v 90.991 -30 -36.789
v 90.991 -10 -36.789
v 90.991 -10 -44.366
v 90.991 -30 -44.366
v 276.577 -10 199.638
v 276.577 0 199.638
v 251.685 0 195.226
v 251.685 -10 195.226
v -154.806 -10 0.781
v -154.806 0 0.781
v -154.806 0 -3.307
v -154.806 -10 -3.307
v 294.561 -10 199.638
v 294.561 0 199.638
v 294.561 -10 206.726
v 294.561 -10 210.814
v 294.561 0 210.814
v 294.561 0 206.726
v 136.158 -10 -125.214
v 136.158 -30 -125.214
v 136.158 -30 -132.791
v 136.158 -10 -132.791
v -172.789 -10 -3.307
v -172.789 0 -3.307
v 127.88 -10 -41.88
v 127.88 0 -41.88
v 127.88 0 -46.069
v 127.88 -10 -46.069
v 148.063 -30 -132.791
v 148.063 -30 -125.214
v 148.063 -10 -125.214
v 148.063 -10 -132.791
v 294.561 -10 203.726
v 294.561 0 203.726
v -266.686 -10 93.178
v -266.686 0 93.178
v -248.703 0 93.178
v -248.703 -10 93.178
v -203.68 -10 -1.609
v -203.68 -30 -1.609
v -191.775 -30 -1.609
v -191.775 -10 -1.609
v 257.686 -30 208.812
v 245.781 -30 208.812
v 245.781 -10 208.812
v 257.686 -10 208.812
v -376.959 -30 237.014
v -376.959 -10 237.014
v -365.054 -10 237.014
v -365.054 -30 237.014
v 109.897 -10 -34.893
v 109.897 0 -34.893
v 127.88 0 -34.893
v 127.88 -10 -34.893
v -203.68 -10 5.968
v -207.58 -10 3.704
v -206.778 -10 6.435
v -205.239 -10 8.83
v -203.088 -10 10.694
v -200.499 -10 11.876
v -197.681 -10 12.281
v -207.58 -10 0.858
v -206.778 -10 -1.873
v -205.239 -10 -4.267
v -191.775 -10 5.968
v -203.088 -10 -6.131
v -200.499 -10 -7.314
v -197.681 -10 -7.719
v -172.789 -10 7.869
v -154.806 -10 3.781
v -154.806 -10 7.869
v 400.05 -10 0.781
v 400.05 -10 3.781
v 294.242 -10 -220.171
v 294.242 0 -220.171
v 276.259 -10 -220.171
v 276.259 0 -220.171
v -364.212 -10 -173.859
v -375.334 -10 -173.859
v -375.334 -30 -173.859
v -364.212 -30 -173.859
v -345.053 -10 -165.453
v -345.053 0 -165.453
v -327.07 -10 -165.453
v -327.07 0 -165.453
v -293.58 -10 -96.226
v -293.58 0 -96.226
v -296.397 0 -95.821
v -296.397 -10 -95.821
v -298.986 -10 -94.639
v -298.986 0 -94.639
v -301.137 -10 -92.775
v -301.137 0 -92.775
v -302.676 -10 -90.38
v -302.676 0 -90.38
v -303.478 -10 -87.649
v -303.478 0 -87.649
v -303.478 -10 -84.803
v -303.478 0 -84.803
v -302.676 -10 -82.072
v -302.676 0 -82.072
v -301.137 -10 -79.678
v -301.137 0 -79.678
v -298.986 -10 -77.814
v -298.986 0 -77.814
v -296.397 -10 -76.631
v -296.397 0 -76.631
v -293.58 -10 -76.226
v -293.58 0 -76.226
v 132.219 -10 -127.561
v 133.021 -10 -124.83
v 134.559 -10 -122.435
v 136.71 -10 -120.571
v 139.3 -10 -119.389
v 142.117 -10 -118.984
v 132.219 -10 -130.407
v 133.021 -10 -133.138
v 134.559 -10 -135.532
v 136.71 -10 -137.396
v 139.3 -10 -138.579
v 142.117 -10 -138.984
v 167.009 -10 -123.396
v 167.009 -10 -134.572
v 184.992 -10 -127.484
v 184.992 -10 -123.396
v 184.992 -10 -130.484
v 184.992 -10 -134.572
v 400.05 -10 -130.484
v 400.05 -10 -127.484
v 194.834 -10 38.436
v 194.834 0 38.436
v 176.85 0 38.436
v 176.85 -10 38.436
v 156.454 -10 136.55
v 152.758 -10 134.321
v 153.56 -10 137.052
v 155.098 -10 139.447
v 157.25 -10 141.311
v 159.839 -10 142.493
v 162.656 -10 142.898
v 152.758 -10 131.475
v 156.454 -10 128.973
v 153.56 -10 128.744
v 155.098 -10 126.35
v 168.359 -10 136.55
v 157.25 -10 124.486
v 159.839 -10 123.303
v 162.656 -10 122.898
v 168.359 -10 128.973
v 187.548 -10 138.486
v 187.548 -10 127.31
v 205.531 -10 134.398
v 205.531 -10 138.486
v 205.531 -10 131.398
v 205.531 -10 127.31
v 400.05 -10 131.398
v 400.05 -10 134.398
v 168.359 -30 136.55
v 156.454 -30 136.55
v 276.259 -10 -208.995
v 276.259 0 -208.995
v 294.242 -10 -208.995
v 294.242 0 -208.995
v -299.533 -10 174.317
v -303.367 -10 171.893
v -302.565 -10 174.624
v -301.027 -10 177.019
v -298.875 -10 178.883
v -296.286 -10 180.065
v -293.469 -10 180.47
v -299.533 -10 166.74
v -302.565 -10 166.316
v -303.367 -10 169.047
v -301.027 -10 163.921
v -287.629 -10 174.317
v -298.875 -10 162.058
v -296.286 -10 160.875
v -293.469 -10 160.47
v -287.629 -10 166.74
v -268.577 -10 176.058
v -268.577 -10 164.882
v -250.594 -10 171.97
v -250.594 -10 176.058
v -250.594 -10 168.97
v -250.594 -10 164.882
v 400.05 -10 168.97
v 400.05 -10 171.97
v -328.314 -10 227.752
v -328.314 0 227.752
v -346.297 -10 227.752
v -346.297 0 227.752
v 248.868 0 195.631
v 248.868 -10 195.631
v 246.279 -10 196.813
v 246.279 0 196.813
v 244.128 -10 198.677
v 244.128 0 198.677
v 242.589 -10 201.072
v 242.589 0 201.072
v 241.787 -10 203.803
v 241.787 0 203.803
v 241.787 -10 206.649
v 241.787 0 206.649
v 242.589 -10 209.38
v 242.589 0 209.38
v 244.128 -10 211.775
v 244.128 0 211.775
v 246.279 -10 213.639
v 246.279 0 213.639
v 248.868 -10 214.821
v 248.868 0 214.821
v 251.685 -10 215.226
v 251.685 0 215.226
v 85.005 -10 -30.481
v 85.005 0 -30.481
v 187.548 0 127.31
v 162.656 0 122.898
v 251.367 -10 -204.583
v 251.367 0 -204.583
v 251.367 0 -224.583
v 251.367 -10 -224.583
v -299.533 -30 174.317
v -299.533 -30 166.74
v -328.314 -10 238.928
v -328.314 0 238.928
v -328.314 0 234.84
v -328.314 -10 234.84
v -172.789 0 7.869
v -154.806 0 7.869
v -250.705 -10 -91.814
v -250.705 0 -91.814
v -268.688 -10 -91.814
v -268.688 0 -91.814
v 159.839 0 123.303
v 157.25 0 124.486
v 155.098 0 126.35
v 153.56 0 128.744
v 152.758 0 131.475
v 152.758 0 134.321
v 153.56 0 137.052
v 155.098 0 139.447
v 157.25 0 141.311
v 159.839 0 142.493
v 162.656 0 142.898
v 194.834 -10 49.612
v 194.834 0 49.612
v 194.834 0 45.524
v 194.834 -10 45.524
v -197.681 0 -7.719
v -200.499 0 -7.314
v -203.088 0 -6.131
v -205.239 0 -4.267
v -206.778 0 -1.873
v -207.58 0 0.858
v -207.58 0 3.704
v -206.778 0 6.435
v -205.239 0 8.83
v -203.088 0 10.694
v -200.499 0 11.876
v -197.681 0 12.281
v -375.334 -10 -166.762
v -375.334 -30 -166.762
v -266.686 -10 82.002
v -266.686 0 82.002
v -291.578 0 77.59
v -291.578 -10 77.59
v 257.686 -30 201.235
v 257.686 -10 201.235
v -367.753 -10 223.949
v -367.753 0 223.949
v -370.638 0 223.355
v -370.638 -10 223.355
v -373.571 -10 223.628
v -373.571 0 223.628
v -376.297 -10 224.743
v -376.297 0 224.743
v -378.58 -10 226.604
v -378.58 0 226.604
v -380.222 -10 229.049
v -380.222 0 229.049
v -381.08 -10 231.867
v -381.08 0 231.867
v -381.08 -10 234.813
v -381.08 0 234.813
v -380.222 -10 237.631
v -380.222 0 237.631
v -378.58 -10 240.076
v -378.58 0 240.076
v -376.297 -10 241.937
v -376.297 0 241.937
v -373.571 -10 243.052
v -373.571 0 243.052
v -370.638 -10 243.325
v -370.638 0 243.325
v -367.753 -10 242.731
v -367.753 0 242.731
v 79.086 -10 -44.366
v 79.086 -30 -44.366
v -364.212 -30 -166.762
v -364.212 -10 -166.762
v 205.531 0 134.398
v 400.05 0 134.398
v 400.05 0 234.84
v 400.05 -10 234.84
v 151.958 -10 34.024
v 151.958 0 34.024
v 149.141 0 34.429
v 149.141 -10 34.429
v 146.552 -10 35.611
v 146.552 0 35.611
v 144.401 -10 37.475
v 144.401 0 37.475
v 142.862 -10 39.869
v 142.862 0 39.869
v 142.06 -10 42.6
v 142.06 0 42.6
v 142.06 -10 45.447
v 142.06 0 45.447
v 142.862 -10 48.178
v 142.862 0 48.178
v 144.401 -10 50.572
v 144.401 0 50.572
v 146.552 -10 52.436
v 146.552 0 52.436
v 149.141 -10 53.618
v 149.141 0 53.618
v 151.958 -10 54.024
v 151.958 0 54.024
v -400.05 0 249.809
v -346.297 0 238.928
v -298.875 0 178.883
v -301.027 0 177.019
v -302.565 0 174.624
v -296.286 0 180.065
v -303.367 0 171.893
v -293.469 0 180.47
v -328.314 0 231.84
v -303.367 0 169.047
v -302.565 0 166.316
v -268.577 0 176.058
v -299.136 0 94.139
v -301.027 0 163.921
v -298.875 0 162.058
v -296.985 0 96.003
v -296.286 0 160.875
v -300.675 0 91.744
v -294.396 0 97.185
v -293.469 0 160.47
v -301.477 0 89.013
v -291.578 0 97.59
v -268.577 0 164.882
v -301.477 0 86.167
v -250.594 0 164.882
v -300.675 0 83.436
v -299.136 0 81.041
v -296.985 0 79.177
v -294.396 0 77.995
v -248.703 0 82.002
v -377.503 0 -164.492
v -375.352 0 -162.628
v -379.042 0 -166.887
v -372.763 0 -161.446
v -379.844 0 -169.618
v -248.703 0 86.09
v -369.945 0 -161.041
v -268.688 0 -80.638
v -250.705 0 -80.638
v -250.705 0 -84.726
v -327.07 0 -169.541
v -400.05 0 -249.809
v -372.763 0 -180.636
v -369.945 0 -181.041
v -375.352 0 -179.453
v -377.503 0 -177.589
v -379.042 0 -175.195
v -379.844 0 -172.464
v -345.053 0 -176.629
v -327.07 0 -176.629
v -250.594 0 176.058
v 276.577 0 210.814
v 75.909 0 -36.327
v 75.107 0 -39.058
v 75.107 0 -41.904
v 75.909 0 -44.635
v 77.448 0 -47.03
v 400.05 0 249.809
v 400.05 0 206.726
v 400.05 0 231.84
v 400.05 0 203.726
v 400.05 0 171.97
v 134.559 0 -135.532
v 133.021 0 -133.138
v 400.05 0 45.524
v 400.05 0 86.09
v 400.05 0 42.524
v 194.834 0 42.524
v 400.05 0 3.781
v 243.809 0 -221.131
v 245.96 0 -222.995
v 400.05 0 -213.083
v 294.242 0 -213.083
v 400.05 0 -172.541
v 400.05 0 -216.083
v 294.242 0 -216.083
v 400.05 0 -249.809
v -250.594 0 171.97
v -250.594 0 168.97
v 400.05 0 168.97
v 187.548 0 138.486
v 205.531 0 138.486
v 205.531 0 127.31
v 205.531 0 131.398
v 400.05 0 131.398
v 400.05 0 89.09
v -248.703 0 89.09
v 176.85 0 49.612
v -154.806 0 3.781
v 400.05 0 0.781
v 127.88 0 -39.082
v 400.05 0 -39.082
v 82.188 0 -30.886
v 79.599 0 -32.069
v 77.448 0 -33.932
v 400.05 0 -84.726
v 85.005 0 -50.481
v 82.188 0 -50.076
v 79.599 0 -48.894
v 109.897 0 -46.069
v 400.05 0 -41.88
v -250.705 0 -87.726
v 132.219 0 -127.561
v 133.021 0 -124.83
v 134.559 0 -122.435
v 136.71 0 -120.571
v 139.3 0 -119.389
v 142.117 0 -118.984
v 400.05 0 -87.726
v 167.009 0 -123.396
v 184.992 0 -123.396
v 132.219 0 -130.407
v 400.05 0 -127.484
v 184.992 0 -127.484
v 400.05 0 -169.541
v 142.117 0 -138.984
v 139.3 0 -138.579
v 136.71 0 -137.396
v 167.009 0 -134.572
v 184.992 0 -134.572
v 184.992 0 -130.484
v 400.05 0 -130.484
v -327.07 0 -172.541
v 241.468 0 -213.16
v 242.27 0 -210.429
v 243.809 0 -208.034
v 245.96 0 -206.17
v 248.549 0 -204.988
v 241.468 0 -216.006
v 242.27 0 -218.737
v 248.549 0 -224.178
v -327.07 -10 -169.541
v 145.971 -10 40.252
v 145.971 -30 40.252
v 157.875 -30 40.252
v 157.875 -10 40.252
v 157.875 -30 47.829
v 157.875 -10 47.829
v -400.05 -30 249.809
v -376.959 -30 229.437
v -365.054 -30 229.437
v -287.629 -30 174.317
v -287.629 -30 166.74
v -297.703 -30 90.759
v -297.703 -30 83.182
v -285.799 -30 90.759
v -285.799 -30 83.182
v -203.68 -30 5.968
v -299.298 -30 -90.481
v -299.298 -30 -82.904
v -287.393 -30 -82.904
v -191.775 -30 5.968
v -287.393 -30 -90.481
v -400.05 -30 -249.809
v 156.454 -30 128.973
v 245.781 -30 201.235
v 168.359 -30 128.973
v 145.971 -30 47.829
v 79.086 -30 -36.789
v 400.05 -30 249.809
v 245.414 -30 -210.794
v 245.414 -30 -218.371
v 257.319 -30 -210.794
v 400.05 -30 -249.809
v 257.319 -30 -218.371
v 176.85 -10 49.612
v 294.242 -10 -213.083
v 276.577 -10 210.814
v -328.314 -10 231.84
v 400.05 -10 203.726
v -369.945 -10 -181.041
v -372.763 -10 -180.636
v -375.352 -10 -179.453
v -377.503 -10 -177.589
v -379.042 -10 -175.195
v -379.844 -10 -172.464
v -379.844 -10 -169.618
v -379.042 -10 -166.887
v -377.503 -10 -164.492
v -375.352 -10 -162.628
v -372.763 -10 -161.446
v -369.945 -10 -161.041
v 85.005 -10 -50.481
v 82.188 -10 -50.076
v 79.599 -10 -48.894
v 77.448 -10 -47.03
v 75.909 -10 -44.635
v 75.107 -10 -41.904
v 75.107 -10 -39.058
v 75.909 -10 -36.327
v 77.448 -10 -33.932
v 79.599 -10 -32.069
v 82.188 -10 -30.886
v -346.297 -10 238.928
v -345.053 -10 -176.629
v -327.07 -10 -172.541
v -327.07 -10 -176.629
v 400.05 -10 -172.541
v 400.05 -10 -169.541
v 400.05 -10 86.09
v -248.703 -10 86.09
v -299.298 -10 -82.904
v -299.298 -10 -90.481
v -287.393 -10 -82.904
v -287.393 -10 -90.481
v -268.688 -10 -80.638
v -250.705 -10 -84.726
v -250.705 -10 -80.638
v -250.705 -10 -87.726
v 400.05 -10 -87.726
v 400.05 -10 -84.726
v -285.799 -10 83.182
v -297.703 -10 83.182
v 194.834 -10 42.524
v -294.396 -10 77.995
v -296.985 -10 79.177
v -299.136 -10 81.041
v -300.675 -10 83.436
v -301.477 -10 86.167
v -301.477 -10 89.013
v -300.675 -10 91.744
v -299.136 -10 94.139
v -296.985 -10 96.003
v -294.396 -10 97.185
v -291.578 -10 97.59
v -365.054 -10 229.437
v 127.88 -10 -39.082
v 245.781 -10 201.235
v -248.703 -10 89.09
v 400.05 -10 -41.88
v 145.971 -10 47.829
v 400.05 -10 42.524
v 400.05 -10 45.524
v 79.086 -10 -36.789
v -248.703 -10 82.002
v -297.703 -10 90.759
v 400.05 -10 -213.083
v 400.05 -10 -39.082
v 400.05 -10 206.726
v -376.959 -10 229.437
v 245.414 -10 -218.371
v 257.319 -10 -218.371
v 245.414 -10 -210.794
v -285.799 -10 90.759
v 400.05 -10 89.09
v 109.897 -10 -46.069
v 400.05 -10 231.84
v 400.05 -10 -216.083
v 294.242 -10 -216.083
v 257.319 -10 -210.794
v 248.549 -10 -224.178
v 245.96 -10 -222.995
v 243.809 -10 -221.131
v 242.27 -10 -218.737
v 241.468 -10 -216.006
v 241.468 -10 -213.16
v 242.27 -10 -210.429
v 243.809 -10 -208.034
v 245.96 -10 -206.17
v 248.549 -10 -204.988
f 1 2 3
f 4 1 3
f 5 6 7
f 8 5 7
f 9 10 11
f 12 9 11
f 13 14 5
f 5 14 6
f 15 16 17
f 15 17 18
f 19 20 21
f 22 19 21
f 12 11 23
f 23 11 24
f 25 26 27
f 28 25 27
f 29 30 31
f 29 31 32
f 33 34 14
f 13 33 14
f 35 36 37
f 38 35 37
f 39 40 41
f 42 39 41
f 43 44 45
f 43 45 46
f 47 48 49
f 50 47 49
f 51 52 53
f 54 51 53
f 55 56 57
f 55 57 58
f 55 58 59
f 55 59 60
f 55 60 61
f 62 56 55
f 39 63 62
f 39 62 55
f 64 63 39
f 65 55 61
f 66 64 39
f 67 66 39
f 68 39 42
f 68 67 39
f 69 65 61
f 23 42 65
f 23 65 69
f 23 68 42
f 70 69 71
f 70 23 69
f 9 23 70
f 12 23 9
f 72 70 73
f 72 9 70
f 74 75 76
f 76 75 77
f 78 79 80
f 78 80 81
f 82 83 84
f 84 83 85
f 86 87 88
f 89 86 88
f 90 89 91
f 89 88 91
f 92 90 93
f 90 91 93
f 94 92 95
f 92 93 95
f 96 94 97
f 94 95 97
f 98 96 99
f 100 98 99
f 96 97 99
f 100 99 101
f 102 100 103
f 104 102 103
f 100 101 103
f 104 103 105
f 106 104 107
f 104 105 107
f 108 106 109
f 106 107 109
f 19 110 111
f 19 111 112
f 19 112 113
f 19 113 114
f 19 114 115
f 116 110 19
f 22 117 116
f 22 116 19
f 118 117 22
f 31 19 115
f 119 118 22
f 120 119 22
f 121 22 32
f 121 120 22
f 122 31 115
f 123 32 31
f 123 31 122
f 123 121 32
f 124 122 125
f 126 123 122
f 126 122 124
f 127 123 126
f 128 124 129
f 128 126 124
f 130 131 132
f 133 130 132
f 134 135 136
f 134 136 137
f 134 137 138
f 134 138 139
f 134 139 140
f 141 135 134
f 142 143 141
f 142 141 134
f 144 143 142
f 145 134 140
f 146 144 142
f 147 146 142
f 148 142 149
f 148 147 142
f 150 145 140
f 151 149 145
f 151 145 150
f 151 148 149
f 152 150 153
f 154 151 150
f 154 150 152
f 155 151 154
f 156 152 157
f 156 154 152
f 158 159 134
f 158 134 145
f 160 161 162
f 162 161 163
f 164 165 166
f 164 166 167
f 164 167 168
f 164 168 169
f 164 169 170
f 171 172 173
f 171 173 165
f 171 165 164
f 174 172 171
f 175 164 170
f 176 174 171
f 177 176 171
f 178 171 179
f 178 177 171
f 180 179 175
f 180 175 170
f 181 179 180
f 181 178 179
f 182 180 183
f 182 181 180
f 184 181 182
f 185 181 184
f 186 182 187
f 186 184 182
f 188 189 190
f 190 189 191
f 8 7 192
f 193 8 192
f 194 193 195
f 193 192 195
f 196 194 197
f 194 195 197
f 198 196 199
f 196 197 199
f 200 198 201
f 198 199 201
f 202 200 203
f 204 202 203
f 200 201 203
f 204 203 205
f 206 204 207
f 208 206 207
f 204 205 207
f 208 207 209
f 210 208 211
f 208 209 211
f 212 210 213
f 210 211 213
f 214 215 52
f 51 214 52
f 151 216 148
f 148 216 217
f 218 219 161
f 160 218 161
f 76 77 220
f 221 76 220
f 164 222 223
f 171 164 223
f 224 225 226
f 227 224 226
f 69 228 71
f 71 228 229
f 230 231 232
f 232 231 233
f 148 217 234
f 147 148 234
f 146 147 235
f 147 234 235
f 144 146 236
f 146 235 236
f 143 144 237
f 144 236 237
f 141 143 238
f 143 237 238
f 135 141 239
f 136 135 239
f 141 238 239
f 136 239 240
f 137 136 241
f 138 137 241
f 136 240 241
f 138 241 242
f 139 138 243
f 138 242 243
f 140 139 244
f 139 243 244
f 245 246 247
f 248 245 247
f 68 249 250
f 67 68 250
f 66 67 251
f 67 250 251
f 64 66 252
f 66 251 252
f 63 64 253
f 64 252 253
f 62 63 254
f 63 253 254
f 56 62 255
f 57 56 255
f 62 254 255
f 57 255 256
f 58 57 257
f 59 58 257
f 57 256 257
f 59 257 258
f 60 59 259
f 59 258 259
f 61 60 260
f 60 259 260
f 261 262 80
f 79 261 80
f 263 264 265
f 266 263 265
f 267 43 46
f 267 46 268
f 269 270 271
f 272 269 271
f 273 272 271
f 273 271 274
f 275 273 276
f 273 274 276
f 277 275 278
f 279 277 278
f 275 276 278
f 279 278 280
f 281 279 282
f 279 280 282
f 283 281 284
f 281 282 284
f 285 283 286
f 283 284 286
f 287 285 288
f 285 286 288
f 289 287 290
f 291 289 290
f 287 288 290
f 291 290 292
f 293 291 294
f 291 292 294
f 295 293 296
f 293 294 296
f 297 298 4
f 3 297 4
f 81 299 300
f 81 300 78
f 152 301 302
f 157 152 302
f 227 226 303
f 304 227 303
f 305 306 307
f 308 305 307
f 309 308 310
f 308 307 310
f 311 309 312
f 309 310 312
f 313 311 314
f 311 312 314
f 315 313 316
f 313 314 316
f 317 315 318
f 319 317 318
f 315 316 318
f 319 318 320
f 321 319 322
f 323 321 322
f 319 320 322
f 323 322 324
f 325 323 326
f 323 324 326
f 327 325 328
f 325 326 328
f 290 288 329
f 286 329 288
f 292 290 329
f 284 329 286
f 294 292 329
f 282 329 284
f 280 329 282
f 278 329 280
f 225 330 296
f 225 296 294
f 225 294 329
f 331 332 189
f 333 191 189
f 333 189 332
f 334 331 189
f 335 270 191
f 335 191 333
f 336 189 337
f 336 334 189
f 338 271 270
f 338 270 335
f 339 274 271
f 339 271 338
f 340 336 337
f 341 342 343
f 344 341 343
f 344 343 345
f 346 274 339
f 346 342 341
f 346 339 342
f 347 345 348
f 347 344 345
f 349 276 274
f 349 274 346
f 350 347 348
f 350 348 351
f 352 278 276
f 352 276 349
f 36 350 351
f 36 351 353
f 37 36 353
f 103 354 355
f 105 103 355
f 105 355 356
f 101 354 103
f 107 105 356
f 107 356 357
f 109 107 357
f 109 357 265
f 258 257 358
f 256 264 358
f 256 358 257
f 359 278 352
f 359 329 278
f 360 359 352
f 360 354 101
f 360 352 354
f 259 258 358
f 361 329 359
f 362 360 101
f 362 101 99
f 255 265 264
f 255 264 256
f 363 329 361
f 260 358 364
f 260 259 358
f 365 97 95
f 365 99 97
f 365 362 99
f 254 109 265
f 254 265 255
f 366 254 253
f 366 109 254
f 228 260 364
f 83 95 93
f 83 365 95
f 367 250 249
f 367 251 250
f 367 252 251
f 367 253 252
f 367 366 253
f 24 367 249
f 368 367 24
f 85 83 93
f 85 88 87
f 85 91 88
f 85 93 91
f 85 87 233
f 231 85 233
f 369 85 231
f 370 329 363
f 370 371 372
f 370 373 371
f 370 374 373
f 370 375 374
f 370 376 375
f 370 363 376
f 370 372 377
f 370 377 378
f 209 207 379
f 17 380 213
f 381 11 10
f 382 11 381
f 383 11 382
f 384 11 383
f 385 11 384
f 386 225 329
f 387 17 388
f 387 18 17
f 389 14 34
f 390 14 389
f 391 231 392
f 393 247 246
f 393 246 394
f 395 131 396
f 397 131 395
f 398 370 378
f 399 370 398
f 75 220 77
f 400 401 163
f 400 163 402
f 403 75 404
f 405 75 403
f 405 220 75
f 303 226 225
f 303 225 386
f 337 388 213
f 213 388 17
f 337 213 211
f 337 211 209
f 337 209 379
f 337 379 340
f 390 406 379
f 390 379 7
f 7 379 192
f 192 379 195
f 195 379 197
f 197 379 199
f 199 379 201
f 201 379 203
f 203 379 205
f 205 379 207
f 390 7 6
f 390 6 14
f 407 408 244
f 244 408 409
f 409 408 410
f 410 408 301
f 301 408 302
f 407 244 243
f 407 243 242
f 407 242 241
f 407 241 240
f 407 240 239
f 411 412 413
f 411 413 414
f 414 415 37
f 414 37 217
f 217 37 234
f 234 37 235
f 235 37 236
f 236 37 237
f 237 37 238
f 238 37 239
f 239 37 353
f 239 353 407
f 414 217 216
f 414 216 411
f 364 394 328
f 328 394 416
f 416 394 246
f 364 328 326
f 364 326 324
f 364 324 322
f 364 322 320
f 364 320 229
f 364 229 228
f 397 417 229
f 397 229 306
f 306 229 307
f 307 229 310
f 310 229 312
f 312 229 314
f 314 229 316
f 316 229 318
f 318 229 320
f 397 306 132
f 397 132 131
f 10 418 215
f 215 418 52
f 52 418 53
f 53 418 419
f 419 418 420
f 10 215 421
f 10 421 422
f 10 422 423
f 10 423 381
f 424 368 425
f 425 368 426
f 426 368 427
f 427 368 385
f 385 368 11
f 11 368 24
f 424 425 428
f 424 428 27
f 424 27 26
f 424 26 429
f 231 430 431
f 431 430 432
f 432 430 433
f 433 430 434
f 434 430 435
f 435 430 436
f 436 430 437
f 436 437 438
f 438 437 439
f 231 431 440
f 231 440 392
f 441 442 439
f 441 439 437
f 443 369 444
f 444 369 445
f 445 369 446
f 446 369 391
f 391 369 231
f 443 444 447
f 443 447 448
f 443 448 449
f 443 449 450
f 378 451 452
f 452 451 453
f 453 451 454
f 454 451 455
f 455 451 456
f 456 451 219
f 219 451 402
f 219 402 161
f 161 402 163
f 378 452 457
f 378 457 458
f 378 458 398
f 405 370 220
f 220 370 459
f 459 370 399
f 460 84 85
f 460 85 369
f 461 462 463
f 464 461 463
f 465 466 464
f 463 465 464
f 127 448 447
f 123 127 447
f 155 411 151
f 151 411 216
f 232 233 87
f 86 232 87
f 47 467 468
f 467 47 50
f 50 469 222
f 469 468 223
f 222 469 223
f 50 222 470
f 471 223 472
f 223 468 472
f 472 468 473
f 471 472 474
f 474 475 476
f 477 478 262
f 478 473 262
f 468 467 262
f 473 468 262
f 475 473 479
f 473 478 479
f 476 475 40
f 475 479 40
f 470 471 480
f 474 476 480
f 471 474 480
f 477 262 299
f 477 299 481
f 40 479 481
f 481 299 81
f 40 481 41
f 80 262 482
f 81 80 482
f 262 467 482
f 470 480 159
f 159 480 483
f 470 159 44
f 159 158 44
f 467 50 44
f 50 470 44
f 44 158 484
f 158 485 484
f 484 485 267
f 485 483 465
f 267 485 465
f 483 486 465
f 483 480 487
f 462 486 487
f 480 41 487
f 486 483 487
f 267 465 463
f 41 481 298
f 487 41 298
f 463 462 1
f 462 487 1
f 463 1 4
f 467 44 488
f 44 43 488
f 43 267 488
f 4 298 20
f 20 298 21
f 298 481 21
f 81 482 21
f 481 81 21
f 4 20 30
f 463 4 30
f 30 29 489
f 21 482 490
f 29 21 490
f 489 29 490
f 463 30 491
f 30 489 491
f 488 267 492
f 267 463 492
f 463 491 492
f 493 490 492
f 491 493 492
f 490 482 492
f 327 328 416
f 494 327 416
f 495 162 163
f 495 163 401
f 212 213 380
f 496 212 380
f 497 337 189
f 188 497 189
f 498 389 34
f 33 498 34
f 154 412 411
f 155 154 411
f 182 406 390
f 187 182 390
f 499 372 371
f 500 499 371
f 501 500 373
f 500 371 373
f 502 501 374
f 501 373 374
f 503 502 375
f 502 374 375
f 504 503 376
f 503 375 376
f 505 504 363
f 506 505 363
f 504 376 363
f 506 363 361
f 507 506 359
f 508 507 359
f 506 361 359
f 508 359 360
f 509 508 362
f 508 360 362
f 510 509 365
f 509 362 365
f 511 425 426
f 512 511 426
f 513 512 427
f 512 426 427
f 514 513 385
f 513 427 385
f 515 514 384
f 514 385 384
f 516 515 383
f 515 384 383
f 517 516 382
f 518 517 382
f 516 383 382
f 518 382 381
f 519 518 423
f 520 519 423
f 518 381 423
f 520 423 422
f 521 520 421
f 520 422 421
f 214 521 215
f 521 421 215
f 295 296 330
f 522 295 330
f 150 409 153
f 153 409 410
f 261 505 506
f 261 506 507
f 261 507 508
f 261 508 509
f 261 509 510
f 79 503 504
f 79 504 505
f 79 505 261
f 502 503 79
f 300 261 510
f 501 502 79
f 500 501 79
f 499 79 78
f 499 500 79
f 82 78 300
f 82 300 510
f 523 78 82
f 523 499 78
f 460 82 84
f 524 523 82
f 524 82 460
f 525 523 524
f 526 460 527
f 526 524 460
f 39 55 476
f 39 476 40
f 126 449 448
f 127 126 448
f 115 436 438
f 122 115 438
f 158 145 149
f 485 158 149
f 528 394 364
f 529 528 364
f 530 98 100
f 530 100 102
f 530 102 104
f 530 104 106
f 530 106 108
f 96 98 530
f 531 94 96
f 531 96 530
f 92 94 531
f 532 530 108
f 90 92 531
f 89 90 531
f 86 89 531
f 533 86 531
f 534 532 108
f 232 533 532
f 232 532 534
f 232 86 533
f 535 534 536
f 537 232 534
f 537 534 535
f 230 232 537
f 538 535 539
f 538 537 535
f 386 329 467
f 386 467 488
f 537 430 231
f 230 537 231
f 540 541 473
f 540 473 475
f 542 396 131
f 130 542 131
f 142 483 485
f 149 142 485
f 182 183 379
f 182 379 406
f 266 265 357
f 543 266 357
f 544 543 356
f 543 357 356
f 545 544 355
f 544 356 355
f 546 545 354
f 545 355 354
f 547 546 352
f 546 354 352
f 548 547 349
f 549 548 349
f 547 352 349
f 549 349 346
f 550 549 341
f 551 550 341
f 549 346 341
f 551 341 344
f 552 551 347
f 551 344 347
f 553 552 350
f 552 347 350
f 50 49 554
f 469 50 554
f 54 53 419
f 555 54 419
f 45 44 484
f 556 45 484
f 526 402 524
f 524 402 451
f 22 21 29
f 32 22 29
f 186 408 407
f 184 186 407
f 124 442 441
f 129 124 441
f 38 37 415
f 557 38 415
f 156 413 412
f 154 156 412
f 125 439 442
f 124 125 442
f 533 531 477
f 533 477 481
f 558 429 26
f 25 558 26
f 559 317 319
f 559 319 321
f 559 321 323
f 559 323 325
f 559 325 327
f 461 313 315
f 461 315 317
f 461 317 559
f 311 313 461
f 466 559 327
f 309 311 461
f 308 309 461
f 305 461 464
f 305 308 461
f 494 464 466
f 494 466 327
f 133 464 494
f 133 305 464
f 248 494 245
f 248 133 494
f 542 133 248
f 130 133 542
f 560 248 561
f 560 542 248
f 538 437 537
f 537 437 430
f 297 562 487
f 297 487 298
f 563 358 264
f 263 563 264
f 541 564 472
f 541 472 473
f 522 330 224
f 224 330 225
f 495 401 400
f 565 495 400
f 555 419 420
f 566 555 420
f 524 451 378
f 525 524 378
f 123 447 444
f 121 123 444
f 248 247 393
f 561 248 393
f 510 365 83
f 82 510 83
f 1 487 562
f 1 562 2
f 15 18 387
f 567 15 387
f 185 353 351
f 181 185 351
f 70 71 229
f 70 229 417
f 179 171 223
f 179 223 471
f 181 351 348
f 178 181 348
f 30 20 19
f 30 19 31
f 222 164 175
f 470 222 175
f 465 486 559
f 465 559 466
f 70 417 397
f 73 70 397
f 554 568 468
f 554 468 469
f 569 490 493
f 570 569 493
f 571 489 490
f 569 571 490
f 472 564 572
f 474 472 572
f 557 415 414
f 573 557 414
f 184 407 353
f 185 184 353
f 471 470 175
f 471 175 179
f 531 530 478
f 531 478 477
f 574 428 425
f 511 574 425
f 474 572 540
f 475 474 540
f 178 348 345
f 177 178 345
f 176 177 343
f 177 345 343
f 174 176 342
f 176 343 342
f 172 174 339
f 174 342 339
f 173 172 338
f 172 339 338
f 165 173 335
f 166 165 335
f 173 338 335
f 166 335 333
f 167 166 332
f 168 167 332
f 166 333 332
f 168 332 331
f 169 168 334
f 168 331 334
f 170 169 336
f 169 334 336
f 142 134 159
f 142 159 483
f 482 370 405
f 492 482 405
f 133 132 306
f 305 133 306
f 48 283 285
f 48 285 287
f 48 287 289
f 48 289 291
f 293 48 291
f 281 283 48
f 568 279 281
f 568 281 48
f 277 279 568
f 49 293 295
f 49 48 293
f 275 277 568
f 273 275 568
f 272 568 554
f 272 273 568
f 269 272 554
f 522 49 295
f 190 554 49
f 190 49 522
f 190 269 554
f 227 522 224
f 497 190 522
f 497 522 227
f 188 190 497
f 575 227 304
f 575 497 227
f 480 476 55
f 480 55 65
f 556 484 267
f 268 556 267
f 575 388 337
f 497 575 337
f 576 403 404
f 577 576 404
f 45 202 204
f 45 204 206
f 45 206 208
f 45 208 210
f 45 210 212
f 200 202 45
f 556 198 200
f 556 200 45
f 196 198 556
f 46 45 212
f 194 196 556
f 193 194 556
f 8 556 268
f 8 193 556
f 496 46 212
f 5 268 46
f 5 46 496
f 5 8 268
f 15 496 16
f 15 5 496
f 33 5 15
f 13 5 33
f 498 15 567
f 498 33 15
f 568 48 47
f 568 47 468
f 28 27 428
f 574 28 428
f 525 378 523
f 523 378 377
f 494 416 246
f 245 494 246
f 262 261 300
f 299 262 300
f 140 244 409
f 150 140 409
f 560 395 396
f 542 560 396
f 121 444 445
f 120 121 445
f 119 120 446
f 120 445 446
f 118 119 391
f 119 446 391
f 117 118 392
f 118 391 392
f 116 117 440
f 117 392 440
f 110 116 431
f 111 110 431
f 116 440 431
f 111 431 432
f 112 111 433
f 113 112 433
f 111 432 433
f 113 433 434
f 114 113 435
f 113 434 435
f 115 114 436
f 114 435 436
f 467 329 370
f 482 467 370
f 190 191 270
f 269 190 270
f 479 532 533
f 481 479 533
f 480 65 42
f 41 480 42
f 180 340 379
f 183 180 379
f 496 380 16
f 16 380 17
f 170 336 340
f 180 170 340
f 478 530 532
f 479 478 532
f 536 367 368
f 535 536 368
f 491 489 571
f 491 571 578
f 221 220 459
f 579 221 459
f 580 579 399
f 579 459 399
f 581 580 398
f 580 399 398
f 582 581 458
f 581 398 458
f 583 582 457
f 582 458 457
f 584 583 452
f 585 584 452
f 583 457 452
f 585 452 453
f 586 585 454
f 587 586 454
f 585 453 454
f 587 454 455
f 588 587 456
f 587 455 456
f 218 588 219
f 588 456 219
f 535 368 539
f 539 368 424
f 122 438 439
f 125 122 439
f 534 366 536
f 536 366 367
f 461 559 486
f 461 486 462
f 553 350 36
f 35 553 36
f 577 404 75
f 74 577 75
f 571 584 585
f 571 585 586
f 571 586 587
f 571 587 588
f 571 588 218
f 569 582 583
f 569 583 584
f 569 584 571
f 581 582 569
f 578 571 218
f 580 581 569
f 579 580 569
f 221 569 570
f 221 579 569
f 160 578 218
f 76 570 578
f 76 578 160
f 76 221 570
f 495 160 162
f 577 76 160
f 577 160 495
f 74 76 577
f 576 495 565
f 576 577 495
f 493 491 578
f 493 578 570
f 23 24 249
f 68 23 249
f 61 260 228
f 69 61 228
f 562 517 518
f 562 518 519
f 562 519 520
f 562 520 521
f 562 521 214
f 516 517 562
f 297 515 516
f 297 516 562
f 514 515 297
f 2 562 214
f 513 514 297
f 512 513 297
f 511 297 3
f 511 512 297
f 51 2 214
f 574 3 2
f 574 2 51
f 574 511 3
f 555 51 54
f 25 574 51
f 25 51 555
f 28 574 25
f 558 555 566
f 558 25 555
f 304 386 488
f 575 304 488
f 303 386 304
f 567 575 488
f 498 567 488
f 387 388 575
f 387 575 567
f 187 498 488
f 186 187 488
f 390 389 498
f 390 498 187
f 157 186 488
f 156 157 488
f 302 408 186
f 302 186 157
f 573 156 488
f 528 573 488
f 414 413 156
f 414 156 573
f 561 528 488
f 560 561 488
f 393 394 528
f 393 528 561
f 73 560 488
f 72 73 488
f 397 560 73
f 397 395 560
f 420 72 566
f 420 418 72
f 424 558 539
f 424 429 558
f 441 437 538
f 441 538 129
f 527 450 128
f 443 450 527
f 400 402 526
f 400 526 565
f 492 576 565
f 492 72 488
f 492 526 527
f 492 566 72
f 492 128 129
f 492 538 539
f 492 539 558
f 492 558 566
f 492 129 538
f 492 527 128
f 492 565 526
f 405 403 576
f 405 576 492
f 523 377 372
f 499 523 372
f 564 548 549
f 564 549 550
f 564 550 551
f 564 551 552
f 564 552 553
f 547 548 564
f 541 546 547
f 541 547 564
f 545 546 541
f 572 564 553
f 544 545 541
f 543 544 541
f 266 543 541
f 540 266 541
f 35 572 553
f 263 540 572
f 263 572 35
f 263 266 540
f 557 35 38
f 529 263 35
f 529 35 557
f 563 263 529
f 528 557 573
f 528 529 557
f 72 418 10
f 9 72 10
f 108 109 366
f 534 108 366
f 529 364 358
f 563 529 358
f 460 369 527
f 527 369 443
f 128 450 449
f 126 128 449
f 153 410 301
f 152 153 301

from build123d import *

# Parameters (mm, degrees)
SKETCH1_W           = 800.1
SKETCH1_H           = 499.618
BOSS_EXTRUDE1_DEPTH = 30
CUT_EXTRUDE3_DEPTH  = 10
SKETCH3_W           = 11.904533089
SKETCH3_H           = 7.577050726
SKETCH3_W_2         = 11.121408268
SKETCH3_H_2         = 7.09624417
SKETCH3_H_3         = 7.577050727
SKETCH3_W_3         = 11.90453309
CUT_EXTRUDE5_DEPTH  = 473.06412592


with BuildPart() as part:
    # Sketch1 → Boss-Extrude1 (new body)
    with BuildSketch(Plane(origin=(0, 0, 0), x_dir=(1, 0, 0), z_dir=(0, 1, 0))):
        Rectangle(SKETCH1_W, SKETCH1_H)
    extrude(amount=-BOSS_EXTRUDE1_DEPTH)

    # Sketch2 → Cut-Extrude3 (cut)
    with BuildSketch(Plane(origin=(0, 0, 0), x_dir=(1, 0, 0), z_dir=(0, 1, 0))):
        with BuildLine():
            ThreePointArc((251.366710834, 224.582705951), (241.366710834, 214.582705951), (251.366710834, 204.582705951))
            Line((251.366710834, 204.582705951), (276.258710834, 208.994705951))
            Line((276.258710834, 208.994705951), (294.241910834, 208.994705951))
            Line((294.241910834, 208.994705951), (294.241910834, 213.082705951))
            Line((294.241910834, 213.082705951), (400.05, 213.082705951))
            Line((400.05, 213.082705951), (400.05, 216.082705951))
            Line((400.05, 216.082705951), (294.241910834, 216.082705951))
            Line((294.241910834, 216.082705951), (294.241910834, 220.170705951))
            Line((294.241910834, 220.170705951), (276.258710834, 220.170705951))
            Line((276.258710834, 220.170705951), (251.366710834, 224.582705951))
        make_face()
        with BuildLine():
            ThreePointArc((-369.945334755, 181.04073751), (-379.945334755, 171.04073751), (-369.945334755, 161.04073751))
            Line((-369.945334755, 161.04073751), (-345.053334755, 165.45273751))
            Line((-345.053334755, 165.45273751), (-327.070134755, 165.45273751))
            Line((-327.070134755, 165.45273751), (-327.070134755, 169.54073751))
            Line((-327.070134755, 169.54073751), (400.05, 169.54073751))
            Line((400.05, 169.54073751), (400.05, 172.54073751))
            Line((400.05, 172.54073751), (-327.070134755, 172.54073751))
            Line((-327.070134755, 172.54073751), (-327.070134755, 176.62873751))
            Line((-327.070134755, 176.62873751), (-345.053334755, 176.62873751))
            Line((-345.053334755, 176.62873751), (-369.945334755, 181.04073751))
        make_face()
        with BuildLine():
            ThreePointArc((142.116905381, 138.983812763), (132.116905381, 128.983812763), (142.116905381, 118.983812763))
            Line((142.116905381, 118.983812763), (167.008905381, 123.395812763))
            Line((167.008905381, 123.395812763), (184.992105381, 123.395812763))
            Line((184.992105381, 123.395812763), (184.992105381, 127.483812763))
            Line((184.992105381, 127.483812763), (400.05, 127.483812763))
            Line((400.05, 127.483812763), (400.05, 130.483812763))
            Line((400.05, 130.483812763), (184.992105381, 130.483812763))
            Line((184.992105381, 130.483812763), (184.992105381, 134.571812763))
            Line((184.992105381, 134.571812763), (167.008905381, 134.571812763))
            Line((167.008905381, 134.571812763), (142.116905381, 138.983812763))
        make_face()
        with BuildLine():
            ThreePointArc((-293.579796741, 96.226149121), (-303.579796741, 86.226149121), (-293.579796741, 76.226149121))
            Line((-293.579796741, 76.226149121), (-268.687796741, 80.638149121))
            Line((-268.687796741, 80.638149121), (-250.704596741, 80.638149121))
            Line((-250.704596741, 80.638149121), (-250.704596741, 84.726149121))
            Line((-250.704596741, 84.726149121), (400.05, 84.726149121))
            Line((400.05, 84.726149121), (400.05, 87.726149121))
            Line((400.05, 87.726149121), (-250.704596741, 87.726149121))
            Line((-250.704596741, 87.726149121), (-250.704596741, 91.814149121))
            Line((-250.704596741, 91.814149121), (-268.687796741, 91.814149121))
            Line((-268.687796741, 91.814149121), (-293.579796741, 96.226149121))
        make_face()
        with BuildLine():
            ThreePointArc((85.005088044, 50.481051347), (75.005088044, 40.481051347), (85.005088044, 30.481051347))
            Line((85.005088044, 30.481051347), (109.897088044, 34.893051347))
            Line((109.897088044, 34.893051347), (127.880288044, 34.893051347))
            Line((127.880288044, 34.893051347), (127.880288044, 39.082302533))
            Line((127.880288044, 39.082302533), (400.05, 39.082302533))
            Line((400.05, 39.082302533), (400.05, 41.87980016))
            Line((400.05, 41.87980016), (127.880288044, 41.87980016))
            Line((127.880288044, 41.87980016), (127.880288044, 46.069051347))
            Line((127.880288044, 46.069051347), (109.897088044, 46.069051347))
            Line((109.897088044, 46.069051347), (85.005088044, 50.481051347))
        make_face()
        with BuildLine():
            ThreePointArc((-197.68138109, 7.718814402), (-207.68138109, -2.281185598), (-197.68138109, -12.281185598))
            Line((-197.68138109, -12.281185598), (-172.78938109, -7.869185598))
            Line((-172.78938109, -7.869185598), (-154.80618109, -7.869185598))
            Line((-154.80618109, -7.869185598), (-154.80618109, -3.781185598))
            Line((-154.80618109, -3.781185598), (400.05, -3.781185598))
            Line((400.05, -3.781185598), (400.05, -0.781185598))
            Line((400.05, -0.781185598), (-154.80618109, -0.781185598))
            Line((-154.80618109, -0.781185598), (-154.80618109, 3.306814402))
            Line((-154.80618109, 3.306814402), (-172.78938109, 3.306814402))
            Line((-172.78938109, 3.306814402), (-197.68138109, 7.718814402))
        make_face()
        with BuildLine():
            ThreePointArc((151.958331876, -34.023556795), (141.958331876, -44.023556795), (151.958331876, -54.023556795))
            Line((151.958331876, -54.023556795), (176.850331876, -49.611556795))
            Line((176.850331876, -49.611556795), (194.833531876, -49.611556795))
            Line((194.833531876, -49.611556795), (194.833531876, -45.523556795))
            Line((194.833531876, -45.523556795), (400.05, -45.523556795))
            Line((400.05, -45.523556795), (400.05, -42.523556795))
            Line((400.05, -42.523556795), (194.833531876, -42.523556795))
            Line((194.833531876, -42.523556795), (194.833531876, -38.435556795))
            Line((194.833531876, -38.435556795), (176.850331876, -38.435556795))
            Line((176.850331876, -38.435556795), (151.958331876, -34.023556795))
        make_face()
        with BuildLine():
            ThreePointArc((-291.578404305, -77.590018504), (-301.578404305, -87.590018504), (-291.578404305, -97.590018504))
            Line((-291.578404305, -97.590018504), (-266.686404305, -93.178018504))
            Line((-266.686404305, -93.178018504), (-248.703204305, -93.178018504))
            Line((-248.703204305, -93.178018504), (-248.703204305, -89.090018504))
            Line((-248.703204305, -89.090018504), (400.05, -89.090018504))
            Line((400.05, -89.090018504), (400.05, -86.090018504))
            Line((400.05, -86.090018504), (-248.703204305, -86.090018504))
            Line((-248.703204305, -86.090018504), (-248.703204305, -82.002018504))
            Line((-248.703204305, -82.002018504), (-266.686404305, -82.002018504))
            Line((-266.686404305, -82.002018504), (-291.578404305, -77.590018504))
        make_face()
        with BuildLine():
            ThreePointArc((-293.469089433, -160.470073486), (-303.469089433, -170.470073486), (-293.469089433, -180.470073486))
            Line((-293.469089433, -180.470073486), (-268.577089433, -176.058073486))
            Line((-268.577089433, -176.058073486), (-250.593889433, -176.058073486))
            Line((-250.593889433, -176.058073486), (-250.593889433, -171.970073486))
            Line((-250.593889433, -171.970073486), (400.05, -171.970073486))
            Line((400.05, -171.970073486), (400.05, -168.970073486))
            Line((400.05, -168.970073486), (-250.593889433, -168.970073486))
            Line((-250.593889433, -168.970073486), (-250.593889433, -164.882073486))
            Line((-250.593889433, -164.882073486), (-268.577089433, -164.882073486))
            Line((-268.577089433, -164.882073486), (-293.469089433, -160.470073486))
        make_face()
        with BuildLine():
            Line((-367.752506177, -242.730724205), (-346.297445197, -238.927906872))
            Line((-346.297445197, -238.927906872), (-328.314245197, -238.927906872))
            Line((-328.314245197, -238.927906872), (-328.314245197, -234.839906872))
            Line((-328.314245197, -234.839906872), (400.05, -234.839906872))
            Line((400.05, -234.839906872), (400.05, -231.839906872))
            Line((400.05, -231.839906872), (-328.314245197, -231.839906872))
            Line((-328.314245197, -231.839906872), (-328.314245197, -227.751906872))
            Line((-328.314245197, -227.751906872), (-346.297445197, -227.751906872))
            Line((-346.297445197, -227.751906872), (-367.752506177, -223.949089539))
            ThreePointArc((-367.752506177, -223.949089539), (-381.189445197, -233.339906872), (-367.752506177, -242.730724205))
        make_face()
        with BuildLine():
            ThreePointArc((162.65597334, -122.898191443), (152.65597334, -132.898191443), (162.65597334, -142.898191443))
            Line((162.65597334, -142.898191443), (187.54797334, -138.486191443))
            Line((187.54797334, -138.486191443), (205.53117334, -138.486191443))
            Line((205.53117334, -138.486191443), (205.53117334, -134.398191443))
            Line((205.53117334, -134.398191443), (400.05, -134.398191443))
            Line((400.05, -134.398191443), (400.05, -131.398191443))
            Line((400.05, -131.398191443), (205.53117334, -131.398191443))
            Line((205.53117334, -131.398191443), (205.53117334, -127.310191443))
            Line((205.53117334, -127.310191443), (187.54797334, -127.310191443))
            Line((187.54797334, -127.310191443), (162.65597334, -122.898191443))
        make_face()
        with BuildLine():
            ThreePointArc((251.685313442, -195.225966369), (241.685313442, -205.225966369), (251.685313442, -215.225966369))
            Line((251.685313442, -215.225966369), (276.577313442, -210.813966369))
            Line((276.577313442, -210.813966369), (294.560513442, -210.813966369))
            Line((294.560513442, -210.813966369), (294.560513442, -206.725966369))
            Line((294.560513442, -206.725966369), (400.05, -206.725966369))
            Line((400.05, -206.725966369), (400.05, -203.725966369))
            Line((400.05, -203.725966369), (294.560513442, -203.725966369))
            Line((294.560513442, -203.725966369), (294.560513442, -199.637966369))
            Line((294.560513442, -199.637966369), (276.577313442, -199.637966369))
            Line((276.577313442, -199.637966369), (251.685313442, -195.225966369))
        make_face()
    extrude(amount=-CUT_EXTRUDE3_DEPTH, mode=Mode.SUBTRACT)

    # Sketch3 → Cut-Extrude5 (cut, through all)
    with BuildSketch(Plane(origin=(0, -10, 0), x_dir=(1, 0, 0), z_dir=(0, 1, 0))):
        with Locations((251.366710834, 214.582705951)):
            Rectangle(SKETCH3_W, SKETCH3_H)
        with Locations((-369.773155385, 170.310554041)):
            Rectangle(SKETCH3_W_2, SKETCH3_H_2)
        with Locations((151.923147728, -44.040321007)):
            Rectangle(SKETCH3_W, SKETCH3_H_3)
        with Locations((85.038457639, 40.577081776)):
            Rectangle(SKETCH3_W, SKETCH3_H)
        with Locations((-197.727360818, -2.179904367)):
            Rectangle(SKETCH3_W_3, SKETCH3_H)
        with Locations((-291.751179531, -86.970771666)):
            Rectangle(SKETCH3_W, SKETCH3_H_3)
        with Locations((-371.006310039, -233.225562931)):
            Rectangle(SKETCH3_W, SKETCH3_H_3)
        with Locations((251.733319115, -205.02345989)):
            Rectangle(SKETCH3_W_3, SKETCH3_H)
        with Locations((-293.345303708, 86.692367874)):
            Rectangle(SKETCH3_W_3, SKETCH3_H_3)
        with Locations((142.110300403, 129.002635792)):
            Rectangle(SKETCH3_W, SKETCH3_H_3)
        with Locations((162.40665728, -132.761369807)):
            Rectangle(SKETCH3_W_3, SKETCH3_H_3)
        with Locations((-293.581129322, -170.528225575)):
            Rectangle(SKETCH3_W, SKETCH3_H_3)
    extrude(amount=-CUT_EXTRUDE5_DEPTH, mode=Mode.SUBTRACT)


solid = part.part
